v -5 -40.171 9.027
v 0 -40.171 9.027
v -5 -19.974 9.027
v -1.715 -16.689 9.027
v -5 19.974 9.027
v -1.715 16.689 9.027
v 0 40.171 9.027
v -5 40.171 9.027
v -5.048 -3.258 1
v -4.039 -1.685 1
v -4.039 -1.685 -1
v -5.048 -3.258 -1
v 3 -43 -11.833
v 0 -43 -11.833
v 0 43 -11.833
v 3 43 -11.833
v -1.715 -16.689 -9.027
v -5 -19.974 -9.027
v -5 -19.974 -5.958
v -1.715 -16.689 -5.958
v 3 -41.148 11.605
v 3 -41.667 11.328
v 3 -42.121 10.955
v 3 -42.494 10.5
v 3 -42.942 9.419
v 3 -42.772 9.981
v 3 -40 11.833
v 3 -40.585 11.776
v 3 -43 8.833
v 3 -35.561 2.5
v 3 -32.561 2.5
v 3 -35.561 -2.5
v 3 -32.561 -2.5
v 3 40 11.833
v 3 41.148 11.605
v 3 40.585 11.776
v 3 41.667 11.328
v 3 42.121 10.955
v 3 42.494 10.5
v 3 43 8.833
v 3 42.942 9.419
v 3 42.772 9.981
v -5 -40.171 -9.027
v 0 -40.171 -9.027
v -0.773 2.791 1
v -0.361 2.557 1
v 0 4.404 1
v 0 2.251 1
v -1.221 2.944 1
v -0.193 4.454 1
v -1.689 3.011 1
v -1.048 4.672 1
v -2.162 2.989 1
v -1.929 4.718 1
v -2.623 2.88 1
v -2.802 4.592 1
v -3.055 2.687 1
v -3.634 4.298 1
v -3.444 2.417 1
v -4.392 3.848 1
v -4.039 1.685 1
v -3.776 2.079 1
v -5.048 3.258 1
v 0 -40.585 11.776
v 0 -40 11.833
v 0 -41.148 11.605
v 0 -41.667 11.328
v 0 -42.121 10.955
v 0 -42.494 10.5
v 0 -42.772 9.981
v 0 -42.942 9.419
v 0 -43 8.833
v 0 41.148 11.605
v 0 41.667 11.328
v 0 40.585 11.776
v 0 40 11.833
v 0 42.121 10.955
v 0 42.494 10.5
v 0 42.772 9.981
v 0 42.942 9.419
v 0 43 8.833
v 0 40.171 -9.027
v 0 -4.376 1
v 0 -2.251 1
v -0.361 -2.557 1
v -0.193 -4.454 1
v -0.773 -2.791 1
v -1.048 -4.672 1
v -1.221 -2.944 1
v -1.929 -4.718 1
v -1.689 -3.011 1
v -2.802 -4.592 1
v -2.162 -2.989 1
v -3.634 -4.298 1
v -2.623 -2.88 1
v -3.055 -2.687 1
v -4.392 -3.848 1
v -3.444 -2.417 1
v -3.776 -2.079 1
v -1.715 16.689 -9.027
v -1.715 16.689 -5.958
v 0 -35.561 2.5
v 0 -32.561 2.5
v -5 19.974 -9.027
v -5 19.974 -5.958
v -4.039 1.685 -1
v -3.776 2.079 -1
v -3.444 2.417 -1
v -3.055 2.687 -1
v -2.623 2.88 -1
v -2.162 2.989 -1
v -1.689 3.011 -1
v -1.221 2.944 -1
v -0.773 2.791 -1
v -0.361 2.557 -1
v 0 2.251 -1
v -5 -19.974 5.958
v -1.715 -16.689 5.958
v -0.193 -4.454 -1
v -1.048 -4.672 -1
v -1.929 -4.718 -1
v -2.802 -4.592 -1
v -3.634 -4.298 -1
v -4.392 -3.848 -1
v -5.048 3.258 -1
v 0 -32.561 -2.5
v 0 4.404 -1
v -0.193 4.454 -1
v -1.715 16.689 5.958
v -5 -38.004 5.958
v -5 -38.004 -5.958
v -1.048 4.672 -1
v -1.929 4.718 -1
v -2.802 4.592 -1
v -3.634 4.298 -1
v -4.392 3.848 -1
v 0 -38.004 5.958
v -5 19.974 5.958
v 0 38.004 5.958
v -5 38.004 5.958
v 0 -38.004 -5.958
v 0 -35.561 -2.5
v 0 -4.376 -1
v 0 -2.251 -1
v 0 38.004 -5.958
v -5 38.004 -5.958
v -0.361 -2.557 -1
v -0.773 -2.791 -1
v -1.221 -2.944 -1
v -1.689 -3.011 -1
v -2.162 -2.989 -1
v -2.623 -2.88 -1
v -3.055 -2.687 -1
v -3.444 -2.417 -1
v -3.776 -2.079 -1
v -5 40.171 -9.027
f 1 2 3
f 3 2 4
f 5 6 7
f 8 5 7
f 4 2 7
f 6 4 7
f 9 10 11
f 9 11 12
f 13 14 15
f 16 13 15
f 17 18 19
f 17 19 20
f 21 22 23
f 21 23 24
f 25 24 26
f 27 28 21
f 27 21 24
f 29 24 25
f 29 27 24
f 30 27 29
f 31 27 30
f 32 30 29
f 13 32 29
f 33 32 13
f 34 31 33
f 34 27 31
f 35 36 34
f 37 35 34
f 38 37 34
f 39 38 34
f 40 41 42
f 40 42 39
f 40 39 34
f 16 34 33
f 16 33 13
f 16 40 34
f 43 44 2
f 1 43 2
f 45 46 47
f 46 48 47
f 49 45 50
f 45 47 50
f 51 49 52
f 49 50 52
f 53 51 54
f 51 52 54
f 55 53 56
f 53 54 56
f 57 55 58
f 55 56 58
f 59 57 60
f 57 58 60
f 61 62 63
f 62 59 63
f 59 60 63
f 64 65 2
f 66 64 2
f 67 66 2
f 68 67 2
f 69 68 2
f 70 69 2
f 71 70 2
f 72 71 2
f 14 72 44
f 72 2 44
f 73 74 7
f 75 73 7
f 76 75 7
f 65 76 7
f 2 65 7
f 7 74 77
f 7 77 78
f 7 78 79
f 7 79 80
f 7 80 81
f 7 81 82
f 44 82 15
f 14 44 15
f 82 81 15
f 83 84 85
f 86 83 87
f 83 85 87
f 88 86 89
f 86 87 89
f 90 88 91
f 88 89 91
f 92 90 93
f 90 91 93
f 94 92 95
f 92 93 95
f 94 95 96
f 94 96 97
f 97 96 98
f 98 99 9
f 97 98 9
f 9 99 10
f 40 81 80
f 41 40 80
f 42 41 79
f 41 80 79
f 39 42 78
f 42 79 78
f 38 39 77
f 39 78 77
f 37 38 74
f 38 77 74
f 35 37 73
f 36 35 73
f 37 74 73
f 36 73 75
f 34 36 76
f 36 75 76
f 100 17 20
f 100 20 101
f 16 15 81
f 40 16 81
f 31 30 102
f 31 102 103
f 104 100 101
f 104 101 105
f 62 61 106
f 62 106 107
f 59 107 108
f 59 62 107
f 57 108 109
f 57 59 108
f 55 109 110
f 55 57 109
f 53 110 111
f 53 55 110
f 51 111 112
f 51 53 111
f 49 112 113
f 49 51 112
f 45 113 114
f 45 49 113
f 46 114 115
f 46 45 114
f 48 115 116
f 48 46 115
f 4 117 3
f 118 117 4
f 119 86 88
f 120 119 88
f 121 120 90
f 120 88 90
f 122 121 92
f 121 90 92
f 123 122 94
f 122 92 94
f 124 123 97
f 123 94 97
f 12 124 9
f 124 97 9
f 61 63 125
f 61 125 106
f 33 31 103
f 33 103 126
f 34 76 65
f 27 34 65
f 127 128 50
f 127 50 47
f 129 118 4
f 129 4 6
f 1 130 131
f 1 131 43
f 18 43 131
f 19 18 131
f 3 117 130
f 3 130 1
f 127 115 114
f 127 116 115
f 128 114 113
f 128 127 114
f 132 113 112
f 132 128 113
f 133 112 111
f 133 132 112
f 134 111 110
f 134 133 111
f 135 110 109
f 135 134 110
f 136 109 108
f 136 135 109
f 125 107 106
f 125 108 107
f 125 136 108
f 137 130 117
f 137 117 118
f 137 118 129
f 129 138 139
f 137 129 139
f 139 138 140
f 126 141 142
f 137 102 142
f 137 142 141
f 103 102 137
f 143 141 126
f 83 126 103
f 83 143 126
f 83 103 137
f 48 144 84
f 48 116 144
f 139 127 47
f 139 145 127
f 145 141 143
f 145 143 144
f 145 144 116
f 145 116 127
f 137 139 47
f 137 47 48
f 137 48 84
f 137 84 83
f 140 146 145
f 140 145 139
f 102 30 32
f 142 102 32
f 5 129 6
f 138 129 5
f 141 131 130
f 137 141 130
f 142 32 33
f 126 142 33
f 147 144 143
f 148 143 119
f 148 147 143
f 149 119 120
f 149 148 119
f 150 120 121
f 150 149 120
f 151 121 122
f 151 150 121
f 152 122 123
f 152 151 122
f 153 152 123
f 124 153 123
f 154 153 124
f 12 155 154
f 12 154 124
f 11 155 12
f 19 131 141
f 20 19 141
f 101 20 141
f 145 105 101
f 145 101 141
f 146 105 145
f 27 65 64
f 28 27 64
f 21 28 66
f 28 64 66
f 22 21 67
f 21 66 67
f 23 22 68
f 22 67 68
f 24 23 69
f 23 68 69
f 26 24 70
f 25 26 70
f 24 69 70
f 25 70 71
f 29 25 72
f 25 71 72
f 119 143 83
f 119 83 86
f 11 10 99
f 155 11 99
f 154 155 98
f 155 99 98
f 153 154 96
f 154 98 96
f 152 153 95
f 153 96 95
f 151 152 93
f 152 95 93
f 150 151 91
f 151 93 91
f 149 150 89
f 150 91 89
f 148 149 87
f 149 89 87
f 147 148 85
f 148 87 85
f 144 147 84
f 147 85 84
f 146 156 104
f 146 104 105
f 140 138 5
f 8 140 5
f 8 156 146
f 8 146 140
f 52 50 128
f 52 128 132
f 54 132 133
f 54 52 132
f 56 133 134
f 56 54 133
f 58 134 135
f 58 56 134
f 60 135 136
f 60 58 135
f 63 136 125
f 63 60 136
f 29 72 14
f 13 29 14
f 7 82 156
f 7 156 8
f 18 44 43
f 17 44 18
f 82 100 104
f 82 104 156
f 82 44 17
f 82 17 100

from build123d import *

# Parameters (mm, degrees)
BOSS_EXTRUDE1_DEPTH     = 3
SKETCH2_W               = 5
SKETCH2_H               = 3
CUT_EXTRUDE1_DEPTH      = 45.699303997
SKETCH3_W               = 18.054262684
SKETCH3_H               = 80.34146894
BOSS_EXTRUDE2_DEPTH     = 5
SKETCH5_W               = 11.91581337
SKETCH5_H               = 76.008445896
CUT_EXTRUDE2_DEPTH      = 5
CUT_EXTRUDE3_DEPTH      = 45.877920827
CUT_EXTRUDE3_DEPTH_BACK = 45.877920827
SKETCH7_W               = 2
SKETCH7_H               = 9
BOSS_EXTRUDE3_DEPTH     = 5
CUT_EXTRUDE4_DEPTH      = 5
SKETCH9_W               = 2.534423144
SKETCH9_H               = 2
CUT_EXTRUDE5_DEPTH      = 1
CUT_EXTRUDE6_DEPTH      = 2
BOSS_EXTRUDE5_DEPTH     = 2
BOSS_EXTRUDE6_DEPTH     = 2
CUT_EXTRUDE7_START      = -2
CUT_EXTRUDE7_DEPTH      = 2


with BuildPart() as part:
    # Sketch1 → Boss-Extrude1 (new body)
    with BuildSketch(Plane(origin=(0, 0, 0), x_dir=(0, 0, -1), z_dir=(1, 0, 0))):
        with BuildLine():
            Line((-8.833333333, -43), (11.833333333, -43))
            Line((11.833333333, -43), (11.833333333, 43))
            Line((11.833333333, 43), (-8.833333333, 43))
            ThreePointArc((-8.833333333, 43), (-10.954653677, 42.121320344), (-11.833333333, 40))
            Line((-11.833333333, 40), (-11.833333333, -40))
            ThreePointArc((-11.833333333, -40), (-10.954653677, -42.121320344), (-8.833333333, -43))
        make_face()
    extrude(amount=BOSS_EXTRUDE1_DEPTH)

    # Sketch2 → Cut-Extrude1 (cut, through all)
    with BuildSketch(Plane(origin=(3, 0, 0), x_dir=(0, 0, -1), z_dir=(1, 0, 0))):
        with Locations((0, -34.060962647)):
            Rectangle(SKETCH2_W, SKETCH2_H)
    extrude(amount=-CUT_EXTRUDE1_DEPTH, mode=Mode.SUBTRACT)

    # Sketch3 → Boss-Extrude2 (add)
    with BuildSketch(Plane.ZY):
        Rectangle(SKETCH3_W, SKETCH3_H)
    extrude(amount=BOSS_EXTRUDE2_DEPTH)

    # Sketch5 → Cut-Extrude2 (cut)
    with BuildSketch(Plane.ZY.offset(5)):
        Rectangle(SKETCH5_W, SKETCH5_H)
    extrude(amount=-CUT_EXTRUDE2_DEPTH, mode=Mode.SUBTRACT)

    # Sketch6 → Cut-Extrude3 (cut, two sides: drawn at the far end of the back side and taken through both)
    with BuildSketch(Plane.XY.offset(-CUT_EXTRUDE3_DEPTH_BACK)):
        Polygon((-5, -19.974207963), (-1.714874455, -16.689082418), (-1.714874455, 16.689082418), (-5, 19.974207963), align=None)
    extrude(amount=CUT_EXTRUDE3_DEPTH + CUT_EXTRUDE3_DEPTH_BACK, mode=Mode.SUBTRACT)

    # Sketch7 → Boss-Extrude3 (add)
    with BuildSketch(Plane.ZY):
        Rectangle(SKETCH7_W, SKETCH7_H)
    extrude(amount=BOSS_EXTRUDE3_DEPTH)

    # Sketch8 → Cut-Extrude4 (cut)
    with BuildSketch(Plane.XY.offset(1)):
        with BuildLine():
            ThreePointArc((-5, -0.459578833), (-2.44210099, -2.530530169), (0, -0.32421434))
            Line((0, -0.32421434), (0, 0.32421434))
            ThreePointArc((0, 0.32421434), (-2.44210099, 2.530530169), (-5, 0.459578833))
            Line((-5, 0.459578833), (-5, -0.459578833))
        make_face()
        with BuildLine():
            Line((-5, -4.5), (-2.510609776, -4.5))
            ThreePointArc((-2.510609776, -4.5), (-3.81075192, -4.308088951), (-5, -3.748724625))
            Line((-5, -3.748724625), (-5, -4.5))
        make_face()
        with BuildLine():
            Line((-2.510609776, -4.5), (0, -4.5))
            Line((0, -4.5), (0, -3.734546632))
            ThreePointArc((0, -3.734546632), (-1.198256898, -4.304384965), (-2.510609776, -4.5))
        make_face()
        with BuildLine():
            ThreePointArc((-2.510609794, 4.5), (-1.198256907, 4.304384967), (0, 3.734546632))
            Line((0, 3.734546632), (0, 4.5))
            Line((0, 4.5), (-2.510609794, 4.5))
        make_face()
        with BuildLine():
            ThreePointArc((-5, 3.748724625), (-3.810751929, 4.308088948), (-2.510609794, 4.5))
            Line((-2.510609794, 4.5), (-5, 4.5))
            Line((-5, 4.5), (-5, 3.748724625))
        make_face()
    extrude(amount=-CUT_EXTRUDE4_DEPTH, mode=Mode.SUBTRACT)

    # Sketch9 → Cut-Extrude5 (cut)
    with BuildSketch(Plane.ZY.offset(5)):
        Rectangle(SKETCH9_W, SKETCH9_H)
    extrude(amount=-CUT_EXTRUDE5_DEPTH, mode=Mode.SUBTRACT)

    # Sketch12 → Cut-Extrude6 (cut)
    with BuildSketch(Plane.XY.offset(1)):
        with BuildLine():
            Line((-4.836179898, -1), (-5, -1))
            Line((-5, -1), (-5, -3.748724625))
            ThreePointArc((-5, -3.748724625), (-2.497849634, -4.499981909), (0, -3.734546632))
            Line((0, -3.734546632), (0, -0.32421434))
            ThreePointArc((0, -0.32421434), (-2.160279243, -2.507098902), (-4.836179898, -1))
        make_face()
        with BuildLine():
            Line((-5, 3.748724625), (-5, 1))
            Line((-5, 1), (-4.836179898, 1))
            ThreePointArc((-4.836179898, 1), (-2.160279243, 2.507098902), (0, 0.32421434))
            Line((0, 0.32421434), (0, 3.734546632))
            ThreePointArc((0, 3.734546632), (-2.497849634, 4.499981909), (-5, 3.748724625))
        make_face()
    extrude(amount=-CUT_EXTRUDE6_DEPTH, mode=Mode.SUBTRACT)

    # Sketch10 → Boss-Extrude5 (add)
    with BuildSketch(Plane.XY.offset(1)):
        with BuildLine():
            Line((0.632034053, -1.144834058), (-0.193, -4.453864907))
            ThreePointArc((-0.193, -4.453864907), (-2.801828378, -4.592278965), (-5.047908598, -3.258012274))
            Line((-5.047908598, -3.258012274), (-4.41989103, -0.739171385))
            Line((-4.41989103, -0.739171385), (-4.335953587, -0.66680401))
            ThreePointArc((-4.335953587, -0.66680401), (-2.053682052, -3.002243354), (0.632034053, -1.144834058))
        make_face()
        with BuildLine():
            Line((-5.047908598, 3.258012274), (-4.41989103, 0.739171385))
            Line((-4.41989103, 0.739171385), (-4.335953587, 0.66680401))
            ThreePointArc((-4.335953587, 0.66680401), (-2.053682052, 3.002243354), (0.632034053, 1.144834058))
            Line((0.632034053, 1.144834058), (-0.193, 4.453864907))
            ThreePointArc((-0.193, 4.453864907), (-2.801828378, 4.592278965), (-5.047908598, 3.258012274))
        make_face()
    extrude(amount=-BOSS_EXTRUDE5_DEPTH)

    # Sketch13 → Boss-Extrude6 (add)
    with BuildSketch(Plane(origin=(0, 0, -1), x_dir=(-1, 0, 0), z_dir=(0, 0, -1))):
        Polygon((0, 3.679784186), (0.193, 4.453864907), (-0.617433114, 4.244828064), (-0.739085506, -4.079345447), (0.193, -4.453864907), (0, -3.679784186), (0, -2.250971384), (0, 2.250971384), align=None)
    extrude(amount=-BOSS_EXTRUDE6_DEPTH)

    # Sketch15 → Cut-Extrude7 (cut)
    with BuildSketch(Plane(origin=(0, 0, -1), x_dir=(-1, 0, 0), z_dir=(0, 0, -1)).offset(CUT_EXTRUDE7_START)):
        Polygon((4.65583066, 1.685473556), (5.047908598, 3.258012274), (4.038538563, 1.685473556), align=None)
        with BuildLine():
            Line((4.65583066, 1.685473556), (4.038538563, 1.685473556))
            ThreePointArc((4.038538563, 1.685473556), (4.241224486, 1.191898546), (4.335953587, 0.66680401))
            Line((4.335953587, 0.66680401), (4.41989103, 0.739171385))
            Line((4.41989103, 0.739171385), (4.65583066, 1.685473556))
        make_face()
        with BuildLine():
            ThreePointArc((4.335953587, -0.66680401), (4.241224486, -1.191898546), (4.038538563, -1.685473556))
            Line((4.038538563, -1.685473556), (4.65583066, -1.685473556))
            Line((4.65583066, -1.685473556), (4.41989103, -0.739171385))
            Line((4.41989103, -0.739171385), (4.335953587, -0.66680401))
        make_face()
        Polygon((4.65583066, -1.685473556), (4.038538563, -1.685473556), (5.047908598, -3.258012274), align=None)
    extrude(amount=CUT_EXTRUDE7_DEPTH, mode=Mode.SUBTRACT)


solid = part.part
